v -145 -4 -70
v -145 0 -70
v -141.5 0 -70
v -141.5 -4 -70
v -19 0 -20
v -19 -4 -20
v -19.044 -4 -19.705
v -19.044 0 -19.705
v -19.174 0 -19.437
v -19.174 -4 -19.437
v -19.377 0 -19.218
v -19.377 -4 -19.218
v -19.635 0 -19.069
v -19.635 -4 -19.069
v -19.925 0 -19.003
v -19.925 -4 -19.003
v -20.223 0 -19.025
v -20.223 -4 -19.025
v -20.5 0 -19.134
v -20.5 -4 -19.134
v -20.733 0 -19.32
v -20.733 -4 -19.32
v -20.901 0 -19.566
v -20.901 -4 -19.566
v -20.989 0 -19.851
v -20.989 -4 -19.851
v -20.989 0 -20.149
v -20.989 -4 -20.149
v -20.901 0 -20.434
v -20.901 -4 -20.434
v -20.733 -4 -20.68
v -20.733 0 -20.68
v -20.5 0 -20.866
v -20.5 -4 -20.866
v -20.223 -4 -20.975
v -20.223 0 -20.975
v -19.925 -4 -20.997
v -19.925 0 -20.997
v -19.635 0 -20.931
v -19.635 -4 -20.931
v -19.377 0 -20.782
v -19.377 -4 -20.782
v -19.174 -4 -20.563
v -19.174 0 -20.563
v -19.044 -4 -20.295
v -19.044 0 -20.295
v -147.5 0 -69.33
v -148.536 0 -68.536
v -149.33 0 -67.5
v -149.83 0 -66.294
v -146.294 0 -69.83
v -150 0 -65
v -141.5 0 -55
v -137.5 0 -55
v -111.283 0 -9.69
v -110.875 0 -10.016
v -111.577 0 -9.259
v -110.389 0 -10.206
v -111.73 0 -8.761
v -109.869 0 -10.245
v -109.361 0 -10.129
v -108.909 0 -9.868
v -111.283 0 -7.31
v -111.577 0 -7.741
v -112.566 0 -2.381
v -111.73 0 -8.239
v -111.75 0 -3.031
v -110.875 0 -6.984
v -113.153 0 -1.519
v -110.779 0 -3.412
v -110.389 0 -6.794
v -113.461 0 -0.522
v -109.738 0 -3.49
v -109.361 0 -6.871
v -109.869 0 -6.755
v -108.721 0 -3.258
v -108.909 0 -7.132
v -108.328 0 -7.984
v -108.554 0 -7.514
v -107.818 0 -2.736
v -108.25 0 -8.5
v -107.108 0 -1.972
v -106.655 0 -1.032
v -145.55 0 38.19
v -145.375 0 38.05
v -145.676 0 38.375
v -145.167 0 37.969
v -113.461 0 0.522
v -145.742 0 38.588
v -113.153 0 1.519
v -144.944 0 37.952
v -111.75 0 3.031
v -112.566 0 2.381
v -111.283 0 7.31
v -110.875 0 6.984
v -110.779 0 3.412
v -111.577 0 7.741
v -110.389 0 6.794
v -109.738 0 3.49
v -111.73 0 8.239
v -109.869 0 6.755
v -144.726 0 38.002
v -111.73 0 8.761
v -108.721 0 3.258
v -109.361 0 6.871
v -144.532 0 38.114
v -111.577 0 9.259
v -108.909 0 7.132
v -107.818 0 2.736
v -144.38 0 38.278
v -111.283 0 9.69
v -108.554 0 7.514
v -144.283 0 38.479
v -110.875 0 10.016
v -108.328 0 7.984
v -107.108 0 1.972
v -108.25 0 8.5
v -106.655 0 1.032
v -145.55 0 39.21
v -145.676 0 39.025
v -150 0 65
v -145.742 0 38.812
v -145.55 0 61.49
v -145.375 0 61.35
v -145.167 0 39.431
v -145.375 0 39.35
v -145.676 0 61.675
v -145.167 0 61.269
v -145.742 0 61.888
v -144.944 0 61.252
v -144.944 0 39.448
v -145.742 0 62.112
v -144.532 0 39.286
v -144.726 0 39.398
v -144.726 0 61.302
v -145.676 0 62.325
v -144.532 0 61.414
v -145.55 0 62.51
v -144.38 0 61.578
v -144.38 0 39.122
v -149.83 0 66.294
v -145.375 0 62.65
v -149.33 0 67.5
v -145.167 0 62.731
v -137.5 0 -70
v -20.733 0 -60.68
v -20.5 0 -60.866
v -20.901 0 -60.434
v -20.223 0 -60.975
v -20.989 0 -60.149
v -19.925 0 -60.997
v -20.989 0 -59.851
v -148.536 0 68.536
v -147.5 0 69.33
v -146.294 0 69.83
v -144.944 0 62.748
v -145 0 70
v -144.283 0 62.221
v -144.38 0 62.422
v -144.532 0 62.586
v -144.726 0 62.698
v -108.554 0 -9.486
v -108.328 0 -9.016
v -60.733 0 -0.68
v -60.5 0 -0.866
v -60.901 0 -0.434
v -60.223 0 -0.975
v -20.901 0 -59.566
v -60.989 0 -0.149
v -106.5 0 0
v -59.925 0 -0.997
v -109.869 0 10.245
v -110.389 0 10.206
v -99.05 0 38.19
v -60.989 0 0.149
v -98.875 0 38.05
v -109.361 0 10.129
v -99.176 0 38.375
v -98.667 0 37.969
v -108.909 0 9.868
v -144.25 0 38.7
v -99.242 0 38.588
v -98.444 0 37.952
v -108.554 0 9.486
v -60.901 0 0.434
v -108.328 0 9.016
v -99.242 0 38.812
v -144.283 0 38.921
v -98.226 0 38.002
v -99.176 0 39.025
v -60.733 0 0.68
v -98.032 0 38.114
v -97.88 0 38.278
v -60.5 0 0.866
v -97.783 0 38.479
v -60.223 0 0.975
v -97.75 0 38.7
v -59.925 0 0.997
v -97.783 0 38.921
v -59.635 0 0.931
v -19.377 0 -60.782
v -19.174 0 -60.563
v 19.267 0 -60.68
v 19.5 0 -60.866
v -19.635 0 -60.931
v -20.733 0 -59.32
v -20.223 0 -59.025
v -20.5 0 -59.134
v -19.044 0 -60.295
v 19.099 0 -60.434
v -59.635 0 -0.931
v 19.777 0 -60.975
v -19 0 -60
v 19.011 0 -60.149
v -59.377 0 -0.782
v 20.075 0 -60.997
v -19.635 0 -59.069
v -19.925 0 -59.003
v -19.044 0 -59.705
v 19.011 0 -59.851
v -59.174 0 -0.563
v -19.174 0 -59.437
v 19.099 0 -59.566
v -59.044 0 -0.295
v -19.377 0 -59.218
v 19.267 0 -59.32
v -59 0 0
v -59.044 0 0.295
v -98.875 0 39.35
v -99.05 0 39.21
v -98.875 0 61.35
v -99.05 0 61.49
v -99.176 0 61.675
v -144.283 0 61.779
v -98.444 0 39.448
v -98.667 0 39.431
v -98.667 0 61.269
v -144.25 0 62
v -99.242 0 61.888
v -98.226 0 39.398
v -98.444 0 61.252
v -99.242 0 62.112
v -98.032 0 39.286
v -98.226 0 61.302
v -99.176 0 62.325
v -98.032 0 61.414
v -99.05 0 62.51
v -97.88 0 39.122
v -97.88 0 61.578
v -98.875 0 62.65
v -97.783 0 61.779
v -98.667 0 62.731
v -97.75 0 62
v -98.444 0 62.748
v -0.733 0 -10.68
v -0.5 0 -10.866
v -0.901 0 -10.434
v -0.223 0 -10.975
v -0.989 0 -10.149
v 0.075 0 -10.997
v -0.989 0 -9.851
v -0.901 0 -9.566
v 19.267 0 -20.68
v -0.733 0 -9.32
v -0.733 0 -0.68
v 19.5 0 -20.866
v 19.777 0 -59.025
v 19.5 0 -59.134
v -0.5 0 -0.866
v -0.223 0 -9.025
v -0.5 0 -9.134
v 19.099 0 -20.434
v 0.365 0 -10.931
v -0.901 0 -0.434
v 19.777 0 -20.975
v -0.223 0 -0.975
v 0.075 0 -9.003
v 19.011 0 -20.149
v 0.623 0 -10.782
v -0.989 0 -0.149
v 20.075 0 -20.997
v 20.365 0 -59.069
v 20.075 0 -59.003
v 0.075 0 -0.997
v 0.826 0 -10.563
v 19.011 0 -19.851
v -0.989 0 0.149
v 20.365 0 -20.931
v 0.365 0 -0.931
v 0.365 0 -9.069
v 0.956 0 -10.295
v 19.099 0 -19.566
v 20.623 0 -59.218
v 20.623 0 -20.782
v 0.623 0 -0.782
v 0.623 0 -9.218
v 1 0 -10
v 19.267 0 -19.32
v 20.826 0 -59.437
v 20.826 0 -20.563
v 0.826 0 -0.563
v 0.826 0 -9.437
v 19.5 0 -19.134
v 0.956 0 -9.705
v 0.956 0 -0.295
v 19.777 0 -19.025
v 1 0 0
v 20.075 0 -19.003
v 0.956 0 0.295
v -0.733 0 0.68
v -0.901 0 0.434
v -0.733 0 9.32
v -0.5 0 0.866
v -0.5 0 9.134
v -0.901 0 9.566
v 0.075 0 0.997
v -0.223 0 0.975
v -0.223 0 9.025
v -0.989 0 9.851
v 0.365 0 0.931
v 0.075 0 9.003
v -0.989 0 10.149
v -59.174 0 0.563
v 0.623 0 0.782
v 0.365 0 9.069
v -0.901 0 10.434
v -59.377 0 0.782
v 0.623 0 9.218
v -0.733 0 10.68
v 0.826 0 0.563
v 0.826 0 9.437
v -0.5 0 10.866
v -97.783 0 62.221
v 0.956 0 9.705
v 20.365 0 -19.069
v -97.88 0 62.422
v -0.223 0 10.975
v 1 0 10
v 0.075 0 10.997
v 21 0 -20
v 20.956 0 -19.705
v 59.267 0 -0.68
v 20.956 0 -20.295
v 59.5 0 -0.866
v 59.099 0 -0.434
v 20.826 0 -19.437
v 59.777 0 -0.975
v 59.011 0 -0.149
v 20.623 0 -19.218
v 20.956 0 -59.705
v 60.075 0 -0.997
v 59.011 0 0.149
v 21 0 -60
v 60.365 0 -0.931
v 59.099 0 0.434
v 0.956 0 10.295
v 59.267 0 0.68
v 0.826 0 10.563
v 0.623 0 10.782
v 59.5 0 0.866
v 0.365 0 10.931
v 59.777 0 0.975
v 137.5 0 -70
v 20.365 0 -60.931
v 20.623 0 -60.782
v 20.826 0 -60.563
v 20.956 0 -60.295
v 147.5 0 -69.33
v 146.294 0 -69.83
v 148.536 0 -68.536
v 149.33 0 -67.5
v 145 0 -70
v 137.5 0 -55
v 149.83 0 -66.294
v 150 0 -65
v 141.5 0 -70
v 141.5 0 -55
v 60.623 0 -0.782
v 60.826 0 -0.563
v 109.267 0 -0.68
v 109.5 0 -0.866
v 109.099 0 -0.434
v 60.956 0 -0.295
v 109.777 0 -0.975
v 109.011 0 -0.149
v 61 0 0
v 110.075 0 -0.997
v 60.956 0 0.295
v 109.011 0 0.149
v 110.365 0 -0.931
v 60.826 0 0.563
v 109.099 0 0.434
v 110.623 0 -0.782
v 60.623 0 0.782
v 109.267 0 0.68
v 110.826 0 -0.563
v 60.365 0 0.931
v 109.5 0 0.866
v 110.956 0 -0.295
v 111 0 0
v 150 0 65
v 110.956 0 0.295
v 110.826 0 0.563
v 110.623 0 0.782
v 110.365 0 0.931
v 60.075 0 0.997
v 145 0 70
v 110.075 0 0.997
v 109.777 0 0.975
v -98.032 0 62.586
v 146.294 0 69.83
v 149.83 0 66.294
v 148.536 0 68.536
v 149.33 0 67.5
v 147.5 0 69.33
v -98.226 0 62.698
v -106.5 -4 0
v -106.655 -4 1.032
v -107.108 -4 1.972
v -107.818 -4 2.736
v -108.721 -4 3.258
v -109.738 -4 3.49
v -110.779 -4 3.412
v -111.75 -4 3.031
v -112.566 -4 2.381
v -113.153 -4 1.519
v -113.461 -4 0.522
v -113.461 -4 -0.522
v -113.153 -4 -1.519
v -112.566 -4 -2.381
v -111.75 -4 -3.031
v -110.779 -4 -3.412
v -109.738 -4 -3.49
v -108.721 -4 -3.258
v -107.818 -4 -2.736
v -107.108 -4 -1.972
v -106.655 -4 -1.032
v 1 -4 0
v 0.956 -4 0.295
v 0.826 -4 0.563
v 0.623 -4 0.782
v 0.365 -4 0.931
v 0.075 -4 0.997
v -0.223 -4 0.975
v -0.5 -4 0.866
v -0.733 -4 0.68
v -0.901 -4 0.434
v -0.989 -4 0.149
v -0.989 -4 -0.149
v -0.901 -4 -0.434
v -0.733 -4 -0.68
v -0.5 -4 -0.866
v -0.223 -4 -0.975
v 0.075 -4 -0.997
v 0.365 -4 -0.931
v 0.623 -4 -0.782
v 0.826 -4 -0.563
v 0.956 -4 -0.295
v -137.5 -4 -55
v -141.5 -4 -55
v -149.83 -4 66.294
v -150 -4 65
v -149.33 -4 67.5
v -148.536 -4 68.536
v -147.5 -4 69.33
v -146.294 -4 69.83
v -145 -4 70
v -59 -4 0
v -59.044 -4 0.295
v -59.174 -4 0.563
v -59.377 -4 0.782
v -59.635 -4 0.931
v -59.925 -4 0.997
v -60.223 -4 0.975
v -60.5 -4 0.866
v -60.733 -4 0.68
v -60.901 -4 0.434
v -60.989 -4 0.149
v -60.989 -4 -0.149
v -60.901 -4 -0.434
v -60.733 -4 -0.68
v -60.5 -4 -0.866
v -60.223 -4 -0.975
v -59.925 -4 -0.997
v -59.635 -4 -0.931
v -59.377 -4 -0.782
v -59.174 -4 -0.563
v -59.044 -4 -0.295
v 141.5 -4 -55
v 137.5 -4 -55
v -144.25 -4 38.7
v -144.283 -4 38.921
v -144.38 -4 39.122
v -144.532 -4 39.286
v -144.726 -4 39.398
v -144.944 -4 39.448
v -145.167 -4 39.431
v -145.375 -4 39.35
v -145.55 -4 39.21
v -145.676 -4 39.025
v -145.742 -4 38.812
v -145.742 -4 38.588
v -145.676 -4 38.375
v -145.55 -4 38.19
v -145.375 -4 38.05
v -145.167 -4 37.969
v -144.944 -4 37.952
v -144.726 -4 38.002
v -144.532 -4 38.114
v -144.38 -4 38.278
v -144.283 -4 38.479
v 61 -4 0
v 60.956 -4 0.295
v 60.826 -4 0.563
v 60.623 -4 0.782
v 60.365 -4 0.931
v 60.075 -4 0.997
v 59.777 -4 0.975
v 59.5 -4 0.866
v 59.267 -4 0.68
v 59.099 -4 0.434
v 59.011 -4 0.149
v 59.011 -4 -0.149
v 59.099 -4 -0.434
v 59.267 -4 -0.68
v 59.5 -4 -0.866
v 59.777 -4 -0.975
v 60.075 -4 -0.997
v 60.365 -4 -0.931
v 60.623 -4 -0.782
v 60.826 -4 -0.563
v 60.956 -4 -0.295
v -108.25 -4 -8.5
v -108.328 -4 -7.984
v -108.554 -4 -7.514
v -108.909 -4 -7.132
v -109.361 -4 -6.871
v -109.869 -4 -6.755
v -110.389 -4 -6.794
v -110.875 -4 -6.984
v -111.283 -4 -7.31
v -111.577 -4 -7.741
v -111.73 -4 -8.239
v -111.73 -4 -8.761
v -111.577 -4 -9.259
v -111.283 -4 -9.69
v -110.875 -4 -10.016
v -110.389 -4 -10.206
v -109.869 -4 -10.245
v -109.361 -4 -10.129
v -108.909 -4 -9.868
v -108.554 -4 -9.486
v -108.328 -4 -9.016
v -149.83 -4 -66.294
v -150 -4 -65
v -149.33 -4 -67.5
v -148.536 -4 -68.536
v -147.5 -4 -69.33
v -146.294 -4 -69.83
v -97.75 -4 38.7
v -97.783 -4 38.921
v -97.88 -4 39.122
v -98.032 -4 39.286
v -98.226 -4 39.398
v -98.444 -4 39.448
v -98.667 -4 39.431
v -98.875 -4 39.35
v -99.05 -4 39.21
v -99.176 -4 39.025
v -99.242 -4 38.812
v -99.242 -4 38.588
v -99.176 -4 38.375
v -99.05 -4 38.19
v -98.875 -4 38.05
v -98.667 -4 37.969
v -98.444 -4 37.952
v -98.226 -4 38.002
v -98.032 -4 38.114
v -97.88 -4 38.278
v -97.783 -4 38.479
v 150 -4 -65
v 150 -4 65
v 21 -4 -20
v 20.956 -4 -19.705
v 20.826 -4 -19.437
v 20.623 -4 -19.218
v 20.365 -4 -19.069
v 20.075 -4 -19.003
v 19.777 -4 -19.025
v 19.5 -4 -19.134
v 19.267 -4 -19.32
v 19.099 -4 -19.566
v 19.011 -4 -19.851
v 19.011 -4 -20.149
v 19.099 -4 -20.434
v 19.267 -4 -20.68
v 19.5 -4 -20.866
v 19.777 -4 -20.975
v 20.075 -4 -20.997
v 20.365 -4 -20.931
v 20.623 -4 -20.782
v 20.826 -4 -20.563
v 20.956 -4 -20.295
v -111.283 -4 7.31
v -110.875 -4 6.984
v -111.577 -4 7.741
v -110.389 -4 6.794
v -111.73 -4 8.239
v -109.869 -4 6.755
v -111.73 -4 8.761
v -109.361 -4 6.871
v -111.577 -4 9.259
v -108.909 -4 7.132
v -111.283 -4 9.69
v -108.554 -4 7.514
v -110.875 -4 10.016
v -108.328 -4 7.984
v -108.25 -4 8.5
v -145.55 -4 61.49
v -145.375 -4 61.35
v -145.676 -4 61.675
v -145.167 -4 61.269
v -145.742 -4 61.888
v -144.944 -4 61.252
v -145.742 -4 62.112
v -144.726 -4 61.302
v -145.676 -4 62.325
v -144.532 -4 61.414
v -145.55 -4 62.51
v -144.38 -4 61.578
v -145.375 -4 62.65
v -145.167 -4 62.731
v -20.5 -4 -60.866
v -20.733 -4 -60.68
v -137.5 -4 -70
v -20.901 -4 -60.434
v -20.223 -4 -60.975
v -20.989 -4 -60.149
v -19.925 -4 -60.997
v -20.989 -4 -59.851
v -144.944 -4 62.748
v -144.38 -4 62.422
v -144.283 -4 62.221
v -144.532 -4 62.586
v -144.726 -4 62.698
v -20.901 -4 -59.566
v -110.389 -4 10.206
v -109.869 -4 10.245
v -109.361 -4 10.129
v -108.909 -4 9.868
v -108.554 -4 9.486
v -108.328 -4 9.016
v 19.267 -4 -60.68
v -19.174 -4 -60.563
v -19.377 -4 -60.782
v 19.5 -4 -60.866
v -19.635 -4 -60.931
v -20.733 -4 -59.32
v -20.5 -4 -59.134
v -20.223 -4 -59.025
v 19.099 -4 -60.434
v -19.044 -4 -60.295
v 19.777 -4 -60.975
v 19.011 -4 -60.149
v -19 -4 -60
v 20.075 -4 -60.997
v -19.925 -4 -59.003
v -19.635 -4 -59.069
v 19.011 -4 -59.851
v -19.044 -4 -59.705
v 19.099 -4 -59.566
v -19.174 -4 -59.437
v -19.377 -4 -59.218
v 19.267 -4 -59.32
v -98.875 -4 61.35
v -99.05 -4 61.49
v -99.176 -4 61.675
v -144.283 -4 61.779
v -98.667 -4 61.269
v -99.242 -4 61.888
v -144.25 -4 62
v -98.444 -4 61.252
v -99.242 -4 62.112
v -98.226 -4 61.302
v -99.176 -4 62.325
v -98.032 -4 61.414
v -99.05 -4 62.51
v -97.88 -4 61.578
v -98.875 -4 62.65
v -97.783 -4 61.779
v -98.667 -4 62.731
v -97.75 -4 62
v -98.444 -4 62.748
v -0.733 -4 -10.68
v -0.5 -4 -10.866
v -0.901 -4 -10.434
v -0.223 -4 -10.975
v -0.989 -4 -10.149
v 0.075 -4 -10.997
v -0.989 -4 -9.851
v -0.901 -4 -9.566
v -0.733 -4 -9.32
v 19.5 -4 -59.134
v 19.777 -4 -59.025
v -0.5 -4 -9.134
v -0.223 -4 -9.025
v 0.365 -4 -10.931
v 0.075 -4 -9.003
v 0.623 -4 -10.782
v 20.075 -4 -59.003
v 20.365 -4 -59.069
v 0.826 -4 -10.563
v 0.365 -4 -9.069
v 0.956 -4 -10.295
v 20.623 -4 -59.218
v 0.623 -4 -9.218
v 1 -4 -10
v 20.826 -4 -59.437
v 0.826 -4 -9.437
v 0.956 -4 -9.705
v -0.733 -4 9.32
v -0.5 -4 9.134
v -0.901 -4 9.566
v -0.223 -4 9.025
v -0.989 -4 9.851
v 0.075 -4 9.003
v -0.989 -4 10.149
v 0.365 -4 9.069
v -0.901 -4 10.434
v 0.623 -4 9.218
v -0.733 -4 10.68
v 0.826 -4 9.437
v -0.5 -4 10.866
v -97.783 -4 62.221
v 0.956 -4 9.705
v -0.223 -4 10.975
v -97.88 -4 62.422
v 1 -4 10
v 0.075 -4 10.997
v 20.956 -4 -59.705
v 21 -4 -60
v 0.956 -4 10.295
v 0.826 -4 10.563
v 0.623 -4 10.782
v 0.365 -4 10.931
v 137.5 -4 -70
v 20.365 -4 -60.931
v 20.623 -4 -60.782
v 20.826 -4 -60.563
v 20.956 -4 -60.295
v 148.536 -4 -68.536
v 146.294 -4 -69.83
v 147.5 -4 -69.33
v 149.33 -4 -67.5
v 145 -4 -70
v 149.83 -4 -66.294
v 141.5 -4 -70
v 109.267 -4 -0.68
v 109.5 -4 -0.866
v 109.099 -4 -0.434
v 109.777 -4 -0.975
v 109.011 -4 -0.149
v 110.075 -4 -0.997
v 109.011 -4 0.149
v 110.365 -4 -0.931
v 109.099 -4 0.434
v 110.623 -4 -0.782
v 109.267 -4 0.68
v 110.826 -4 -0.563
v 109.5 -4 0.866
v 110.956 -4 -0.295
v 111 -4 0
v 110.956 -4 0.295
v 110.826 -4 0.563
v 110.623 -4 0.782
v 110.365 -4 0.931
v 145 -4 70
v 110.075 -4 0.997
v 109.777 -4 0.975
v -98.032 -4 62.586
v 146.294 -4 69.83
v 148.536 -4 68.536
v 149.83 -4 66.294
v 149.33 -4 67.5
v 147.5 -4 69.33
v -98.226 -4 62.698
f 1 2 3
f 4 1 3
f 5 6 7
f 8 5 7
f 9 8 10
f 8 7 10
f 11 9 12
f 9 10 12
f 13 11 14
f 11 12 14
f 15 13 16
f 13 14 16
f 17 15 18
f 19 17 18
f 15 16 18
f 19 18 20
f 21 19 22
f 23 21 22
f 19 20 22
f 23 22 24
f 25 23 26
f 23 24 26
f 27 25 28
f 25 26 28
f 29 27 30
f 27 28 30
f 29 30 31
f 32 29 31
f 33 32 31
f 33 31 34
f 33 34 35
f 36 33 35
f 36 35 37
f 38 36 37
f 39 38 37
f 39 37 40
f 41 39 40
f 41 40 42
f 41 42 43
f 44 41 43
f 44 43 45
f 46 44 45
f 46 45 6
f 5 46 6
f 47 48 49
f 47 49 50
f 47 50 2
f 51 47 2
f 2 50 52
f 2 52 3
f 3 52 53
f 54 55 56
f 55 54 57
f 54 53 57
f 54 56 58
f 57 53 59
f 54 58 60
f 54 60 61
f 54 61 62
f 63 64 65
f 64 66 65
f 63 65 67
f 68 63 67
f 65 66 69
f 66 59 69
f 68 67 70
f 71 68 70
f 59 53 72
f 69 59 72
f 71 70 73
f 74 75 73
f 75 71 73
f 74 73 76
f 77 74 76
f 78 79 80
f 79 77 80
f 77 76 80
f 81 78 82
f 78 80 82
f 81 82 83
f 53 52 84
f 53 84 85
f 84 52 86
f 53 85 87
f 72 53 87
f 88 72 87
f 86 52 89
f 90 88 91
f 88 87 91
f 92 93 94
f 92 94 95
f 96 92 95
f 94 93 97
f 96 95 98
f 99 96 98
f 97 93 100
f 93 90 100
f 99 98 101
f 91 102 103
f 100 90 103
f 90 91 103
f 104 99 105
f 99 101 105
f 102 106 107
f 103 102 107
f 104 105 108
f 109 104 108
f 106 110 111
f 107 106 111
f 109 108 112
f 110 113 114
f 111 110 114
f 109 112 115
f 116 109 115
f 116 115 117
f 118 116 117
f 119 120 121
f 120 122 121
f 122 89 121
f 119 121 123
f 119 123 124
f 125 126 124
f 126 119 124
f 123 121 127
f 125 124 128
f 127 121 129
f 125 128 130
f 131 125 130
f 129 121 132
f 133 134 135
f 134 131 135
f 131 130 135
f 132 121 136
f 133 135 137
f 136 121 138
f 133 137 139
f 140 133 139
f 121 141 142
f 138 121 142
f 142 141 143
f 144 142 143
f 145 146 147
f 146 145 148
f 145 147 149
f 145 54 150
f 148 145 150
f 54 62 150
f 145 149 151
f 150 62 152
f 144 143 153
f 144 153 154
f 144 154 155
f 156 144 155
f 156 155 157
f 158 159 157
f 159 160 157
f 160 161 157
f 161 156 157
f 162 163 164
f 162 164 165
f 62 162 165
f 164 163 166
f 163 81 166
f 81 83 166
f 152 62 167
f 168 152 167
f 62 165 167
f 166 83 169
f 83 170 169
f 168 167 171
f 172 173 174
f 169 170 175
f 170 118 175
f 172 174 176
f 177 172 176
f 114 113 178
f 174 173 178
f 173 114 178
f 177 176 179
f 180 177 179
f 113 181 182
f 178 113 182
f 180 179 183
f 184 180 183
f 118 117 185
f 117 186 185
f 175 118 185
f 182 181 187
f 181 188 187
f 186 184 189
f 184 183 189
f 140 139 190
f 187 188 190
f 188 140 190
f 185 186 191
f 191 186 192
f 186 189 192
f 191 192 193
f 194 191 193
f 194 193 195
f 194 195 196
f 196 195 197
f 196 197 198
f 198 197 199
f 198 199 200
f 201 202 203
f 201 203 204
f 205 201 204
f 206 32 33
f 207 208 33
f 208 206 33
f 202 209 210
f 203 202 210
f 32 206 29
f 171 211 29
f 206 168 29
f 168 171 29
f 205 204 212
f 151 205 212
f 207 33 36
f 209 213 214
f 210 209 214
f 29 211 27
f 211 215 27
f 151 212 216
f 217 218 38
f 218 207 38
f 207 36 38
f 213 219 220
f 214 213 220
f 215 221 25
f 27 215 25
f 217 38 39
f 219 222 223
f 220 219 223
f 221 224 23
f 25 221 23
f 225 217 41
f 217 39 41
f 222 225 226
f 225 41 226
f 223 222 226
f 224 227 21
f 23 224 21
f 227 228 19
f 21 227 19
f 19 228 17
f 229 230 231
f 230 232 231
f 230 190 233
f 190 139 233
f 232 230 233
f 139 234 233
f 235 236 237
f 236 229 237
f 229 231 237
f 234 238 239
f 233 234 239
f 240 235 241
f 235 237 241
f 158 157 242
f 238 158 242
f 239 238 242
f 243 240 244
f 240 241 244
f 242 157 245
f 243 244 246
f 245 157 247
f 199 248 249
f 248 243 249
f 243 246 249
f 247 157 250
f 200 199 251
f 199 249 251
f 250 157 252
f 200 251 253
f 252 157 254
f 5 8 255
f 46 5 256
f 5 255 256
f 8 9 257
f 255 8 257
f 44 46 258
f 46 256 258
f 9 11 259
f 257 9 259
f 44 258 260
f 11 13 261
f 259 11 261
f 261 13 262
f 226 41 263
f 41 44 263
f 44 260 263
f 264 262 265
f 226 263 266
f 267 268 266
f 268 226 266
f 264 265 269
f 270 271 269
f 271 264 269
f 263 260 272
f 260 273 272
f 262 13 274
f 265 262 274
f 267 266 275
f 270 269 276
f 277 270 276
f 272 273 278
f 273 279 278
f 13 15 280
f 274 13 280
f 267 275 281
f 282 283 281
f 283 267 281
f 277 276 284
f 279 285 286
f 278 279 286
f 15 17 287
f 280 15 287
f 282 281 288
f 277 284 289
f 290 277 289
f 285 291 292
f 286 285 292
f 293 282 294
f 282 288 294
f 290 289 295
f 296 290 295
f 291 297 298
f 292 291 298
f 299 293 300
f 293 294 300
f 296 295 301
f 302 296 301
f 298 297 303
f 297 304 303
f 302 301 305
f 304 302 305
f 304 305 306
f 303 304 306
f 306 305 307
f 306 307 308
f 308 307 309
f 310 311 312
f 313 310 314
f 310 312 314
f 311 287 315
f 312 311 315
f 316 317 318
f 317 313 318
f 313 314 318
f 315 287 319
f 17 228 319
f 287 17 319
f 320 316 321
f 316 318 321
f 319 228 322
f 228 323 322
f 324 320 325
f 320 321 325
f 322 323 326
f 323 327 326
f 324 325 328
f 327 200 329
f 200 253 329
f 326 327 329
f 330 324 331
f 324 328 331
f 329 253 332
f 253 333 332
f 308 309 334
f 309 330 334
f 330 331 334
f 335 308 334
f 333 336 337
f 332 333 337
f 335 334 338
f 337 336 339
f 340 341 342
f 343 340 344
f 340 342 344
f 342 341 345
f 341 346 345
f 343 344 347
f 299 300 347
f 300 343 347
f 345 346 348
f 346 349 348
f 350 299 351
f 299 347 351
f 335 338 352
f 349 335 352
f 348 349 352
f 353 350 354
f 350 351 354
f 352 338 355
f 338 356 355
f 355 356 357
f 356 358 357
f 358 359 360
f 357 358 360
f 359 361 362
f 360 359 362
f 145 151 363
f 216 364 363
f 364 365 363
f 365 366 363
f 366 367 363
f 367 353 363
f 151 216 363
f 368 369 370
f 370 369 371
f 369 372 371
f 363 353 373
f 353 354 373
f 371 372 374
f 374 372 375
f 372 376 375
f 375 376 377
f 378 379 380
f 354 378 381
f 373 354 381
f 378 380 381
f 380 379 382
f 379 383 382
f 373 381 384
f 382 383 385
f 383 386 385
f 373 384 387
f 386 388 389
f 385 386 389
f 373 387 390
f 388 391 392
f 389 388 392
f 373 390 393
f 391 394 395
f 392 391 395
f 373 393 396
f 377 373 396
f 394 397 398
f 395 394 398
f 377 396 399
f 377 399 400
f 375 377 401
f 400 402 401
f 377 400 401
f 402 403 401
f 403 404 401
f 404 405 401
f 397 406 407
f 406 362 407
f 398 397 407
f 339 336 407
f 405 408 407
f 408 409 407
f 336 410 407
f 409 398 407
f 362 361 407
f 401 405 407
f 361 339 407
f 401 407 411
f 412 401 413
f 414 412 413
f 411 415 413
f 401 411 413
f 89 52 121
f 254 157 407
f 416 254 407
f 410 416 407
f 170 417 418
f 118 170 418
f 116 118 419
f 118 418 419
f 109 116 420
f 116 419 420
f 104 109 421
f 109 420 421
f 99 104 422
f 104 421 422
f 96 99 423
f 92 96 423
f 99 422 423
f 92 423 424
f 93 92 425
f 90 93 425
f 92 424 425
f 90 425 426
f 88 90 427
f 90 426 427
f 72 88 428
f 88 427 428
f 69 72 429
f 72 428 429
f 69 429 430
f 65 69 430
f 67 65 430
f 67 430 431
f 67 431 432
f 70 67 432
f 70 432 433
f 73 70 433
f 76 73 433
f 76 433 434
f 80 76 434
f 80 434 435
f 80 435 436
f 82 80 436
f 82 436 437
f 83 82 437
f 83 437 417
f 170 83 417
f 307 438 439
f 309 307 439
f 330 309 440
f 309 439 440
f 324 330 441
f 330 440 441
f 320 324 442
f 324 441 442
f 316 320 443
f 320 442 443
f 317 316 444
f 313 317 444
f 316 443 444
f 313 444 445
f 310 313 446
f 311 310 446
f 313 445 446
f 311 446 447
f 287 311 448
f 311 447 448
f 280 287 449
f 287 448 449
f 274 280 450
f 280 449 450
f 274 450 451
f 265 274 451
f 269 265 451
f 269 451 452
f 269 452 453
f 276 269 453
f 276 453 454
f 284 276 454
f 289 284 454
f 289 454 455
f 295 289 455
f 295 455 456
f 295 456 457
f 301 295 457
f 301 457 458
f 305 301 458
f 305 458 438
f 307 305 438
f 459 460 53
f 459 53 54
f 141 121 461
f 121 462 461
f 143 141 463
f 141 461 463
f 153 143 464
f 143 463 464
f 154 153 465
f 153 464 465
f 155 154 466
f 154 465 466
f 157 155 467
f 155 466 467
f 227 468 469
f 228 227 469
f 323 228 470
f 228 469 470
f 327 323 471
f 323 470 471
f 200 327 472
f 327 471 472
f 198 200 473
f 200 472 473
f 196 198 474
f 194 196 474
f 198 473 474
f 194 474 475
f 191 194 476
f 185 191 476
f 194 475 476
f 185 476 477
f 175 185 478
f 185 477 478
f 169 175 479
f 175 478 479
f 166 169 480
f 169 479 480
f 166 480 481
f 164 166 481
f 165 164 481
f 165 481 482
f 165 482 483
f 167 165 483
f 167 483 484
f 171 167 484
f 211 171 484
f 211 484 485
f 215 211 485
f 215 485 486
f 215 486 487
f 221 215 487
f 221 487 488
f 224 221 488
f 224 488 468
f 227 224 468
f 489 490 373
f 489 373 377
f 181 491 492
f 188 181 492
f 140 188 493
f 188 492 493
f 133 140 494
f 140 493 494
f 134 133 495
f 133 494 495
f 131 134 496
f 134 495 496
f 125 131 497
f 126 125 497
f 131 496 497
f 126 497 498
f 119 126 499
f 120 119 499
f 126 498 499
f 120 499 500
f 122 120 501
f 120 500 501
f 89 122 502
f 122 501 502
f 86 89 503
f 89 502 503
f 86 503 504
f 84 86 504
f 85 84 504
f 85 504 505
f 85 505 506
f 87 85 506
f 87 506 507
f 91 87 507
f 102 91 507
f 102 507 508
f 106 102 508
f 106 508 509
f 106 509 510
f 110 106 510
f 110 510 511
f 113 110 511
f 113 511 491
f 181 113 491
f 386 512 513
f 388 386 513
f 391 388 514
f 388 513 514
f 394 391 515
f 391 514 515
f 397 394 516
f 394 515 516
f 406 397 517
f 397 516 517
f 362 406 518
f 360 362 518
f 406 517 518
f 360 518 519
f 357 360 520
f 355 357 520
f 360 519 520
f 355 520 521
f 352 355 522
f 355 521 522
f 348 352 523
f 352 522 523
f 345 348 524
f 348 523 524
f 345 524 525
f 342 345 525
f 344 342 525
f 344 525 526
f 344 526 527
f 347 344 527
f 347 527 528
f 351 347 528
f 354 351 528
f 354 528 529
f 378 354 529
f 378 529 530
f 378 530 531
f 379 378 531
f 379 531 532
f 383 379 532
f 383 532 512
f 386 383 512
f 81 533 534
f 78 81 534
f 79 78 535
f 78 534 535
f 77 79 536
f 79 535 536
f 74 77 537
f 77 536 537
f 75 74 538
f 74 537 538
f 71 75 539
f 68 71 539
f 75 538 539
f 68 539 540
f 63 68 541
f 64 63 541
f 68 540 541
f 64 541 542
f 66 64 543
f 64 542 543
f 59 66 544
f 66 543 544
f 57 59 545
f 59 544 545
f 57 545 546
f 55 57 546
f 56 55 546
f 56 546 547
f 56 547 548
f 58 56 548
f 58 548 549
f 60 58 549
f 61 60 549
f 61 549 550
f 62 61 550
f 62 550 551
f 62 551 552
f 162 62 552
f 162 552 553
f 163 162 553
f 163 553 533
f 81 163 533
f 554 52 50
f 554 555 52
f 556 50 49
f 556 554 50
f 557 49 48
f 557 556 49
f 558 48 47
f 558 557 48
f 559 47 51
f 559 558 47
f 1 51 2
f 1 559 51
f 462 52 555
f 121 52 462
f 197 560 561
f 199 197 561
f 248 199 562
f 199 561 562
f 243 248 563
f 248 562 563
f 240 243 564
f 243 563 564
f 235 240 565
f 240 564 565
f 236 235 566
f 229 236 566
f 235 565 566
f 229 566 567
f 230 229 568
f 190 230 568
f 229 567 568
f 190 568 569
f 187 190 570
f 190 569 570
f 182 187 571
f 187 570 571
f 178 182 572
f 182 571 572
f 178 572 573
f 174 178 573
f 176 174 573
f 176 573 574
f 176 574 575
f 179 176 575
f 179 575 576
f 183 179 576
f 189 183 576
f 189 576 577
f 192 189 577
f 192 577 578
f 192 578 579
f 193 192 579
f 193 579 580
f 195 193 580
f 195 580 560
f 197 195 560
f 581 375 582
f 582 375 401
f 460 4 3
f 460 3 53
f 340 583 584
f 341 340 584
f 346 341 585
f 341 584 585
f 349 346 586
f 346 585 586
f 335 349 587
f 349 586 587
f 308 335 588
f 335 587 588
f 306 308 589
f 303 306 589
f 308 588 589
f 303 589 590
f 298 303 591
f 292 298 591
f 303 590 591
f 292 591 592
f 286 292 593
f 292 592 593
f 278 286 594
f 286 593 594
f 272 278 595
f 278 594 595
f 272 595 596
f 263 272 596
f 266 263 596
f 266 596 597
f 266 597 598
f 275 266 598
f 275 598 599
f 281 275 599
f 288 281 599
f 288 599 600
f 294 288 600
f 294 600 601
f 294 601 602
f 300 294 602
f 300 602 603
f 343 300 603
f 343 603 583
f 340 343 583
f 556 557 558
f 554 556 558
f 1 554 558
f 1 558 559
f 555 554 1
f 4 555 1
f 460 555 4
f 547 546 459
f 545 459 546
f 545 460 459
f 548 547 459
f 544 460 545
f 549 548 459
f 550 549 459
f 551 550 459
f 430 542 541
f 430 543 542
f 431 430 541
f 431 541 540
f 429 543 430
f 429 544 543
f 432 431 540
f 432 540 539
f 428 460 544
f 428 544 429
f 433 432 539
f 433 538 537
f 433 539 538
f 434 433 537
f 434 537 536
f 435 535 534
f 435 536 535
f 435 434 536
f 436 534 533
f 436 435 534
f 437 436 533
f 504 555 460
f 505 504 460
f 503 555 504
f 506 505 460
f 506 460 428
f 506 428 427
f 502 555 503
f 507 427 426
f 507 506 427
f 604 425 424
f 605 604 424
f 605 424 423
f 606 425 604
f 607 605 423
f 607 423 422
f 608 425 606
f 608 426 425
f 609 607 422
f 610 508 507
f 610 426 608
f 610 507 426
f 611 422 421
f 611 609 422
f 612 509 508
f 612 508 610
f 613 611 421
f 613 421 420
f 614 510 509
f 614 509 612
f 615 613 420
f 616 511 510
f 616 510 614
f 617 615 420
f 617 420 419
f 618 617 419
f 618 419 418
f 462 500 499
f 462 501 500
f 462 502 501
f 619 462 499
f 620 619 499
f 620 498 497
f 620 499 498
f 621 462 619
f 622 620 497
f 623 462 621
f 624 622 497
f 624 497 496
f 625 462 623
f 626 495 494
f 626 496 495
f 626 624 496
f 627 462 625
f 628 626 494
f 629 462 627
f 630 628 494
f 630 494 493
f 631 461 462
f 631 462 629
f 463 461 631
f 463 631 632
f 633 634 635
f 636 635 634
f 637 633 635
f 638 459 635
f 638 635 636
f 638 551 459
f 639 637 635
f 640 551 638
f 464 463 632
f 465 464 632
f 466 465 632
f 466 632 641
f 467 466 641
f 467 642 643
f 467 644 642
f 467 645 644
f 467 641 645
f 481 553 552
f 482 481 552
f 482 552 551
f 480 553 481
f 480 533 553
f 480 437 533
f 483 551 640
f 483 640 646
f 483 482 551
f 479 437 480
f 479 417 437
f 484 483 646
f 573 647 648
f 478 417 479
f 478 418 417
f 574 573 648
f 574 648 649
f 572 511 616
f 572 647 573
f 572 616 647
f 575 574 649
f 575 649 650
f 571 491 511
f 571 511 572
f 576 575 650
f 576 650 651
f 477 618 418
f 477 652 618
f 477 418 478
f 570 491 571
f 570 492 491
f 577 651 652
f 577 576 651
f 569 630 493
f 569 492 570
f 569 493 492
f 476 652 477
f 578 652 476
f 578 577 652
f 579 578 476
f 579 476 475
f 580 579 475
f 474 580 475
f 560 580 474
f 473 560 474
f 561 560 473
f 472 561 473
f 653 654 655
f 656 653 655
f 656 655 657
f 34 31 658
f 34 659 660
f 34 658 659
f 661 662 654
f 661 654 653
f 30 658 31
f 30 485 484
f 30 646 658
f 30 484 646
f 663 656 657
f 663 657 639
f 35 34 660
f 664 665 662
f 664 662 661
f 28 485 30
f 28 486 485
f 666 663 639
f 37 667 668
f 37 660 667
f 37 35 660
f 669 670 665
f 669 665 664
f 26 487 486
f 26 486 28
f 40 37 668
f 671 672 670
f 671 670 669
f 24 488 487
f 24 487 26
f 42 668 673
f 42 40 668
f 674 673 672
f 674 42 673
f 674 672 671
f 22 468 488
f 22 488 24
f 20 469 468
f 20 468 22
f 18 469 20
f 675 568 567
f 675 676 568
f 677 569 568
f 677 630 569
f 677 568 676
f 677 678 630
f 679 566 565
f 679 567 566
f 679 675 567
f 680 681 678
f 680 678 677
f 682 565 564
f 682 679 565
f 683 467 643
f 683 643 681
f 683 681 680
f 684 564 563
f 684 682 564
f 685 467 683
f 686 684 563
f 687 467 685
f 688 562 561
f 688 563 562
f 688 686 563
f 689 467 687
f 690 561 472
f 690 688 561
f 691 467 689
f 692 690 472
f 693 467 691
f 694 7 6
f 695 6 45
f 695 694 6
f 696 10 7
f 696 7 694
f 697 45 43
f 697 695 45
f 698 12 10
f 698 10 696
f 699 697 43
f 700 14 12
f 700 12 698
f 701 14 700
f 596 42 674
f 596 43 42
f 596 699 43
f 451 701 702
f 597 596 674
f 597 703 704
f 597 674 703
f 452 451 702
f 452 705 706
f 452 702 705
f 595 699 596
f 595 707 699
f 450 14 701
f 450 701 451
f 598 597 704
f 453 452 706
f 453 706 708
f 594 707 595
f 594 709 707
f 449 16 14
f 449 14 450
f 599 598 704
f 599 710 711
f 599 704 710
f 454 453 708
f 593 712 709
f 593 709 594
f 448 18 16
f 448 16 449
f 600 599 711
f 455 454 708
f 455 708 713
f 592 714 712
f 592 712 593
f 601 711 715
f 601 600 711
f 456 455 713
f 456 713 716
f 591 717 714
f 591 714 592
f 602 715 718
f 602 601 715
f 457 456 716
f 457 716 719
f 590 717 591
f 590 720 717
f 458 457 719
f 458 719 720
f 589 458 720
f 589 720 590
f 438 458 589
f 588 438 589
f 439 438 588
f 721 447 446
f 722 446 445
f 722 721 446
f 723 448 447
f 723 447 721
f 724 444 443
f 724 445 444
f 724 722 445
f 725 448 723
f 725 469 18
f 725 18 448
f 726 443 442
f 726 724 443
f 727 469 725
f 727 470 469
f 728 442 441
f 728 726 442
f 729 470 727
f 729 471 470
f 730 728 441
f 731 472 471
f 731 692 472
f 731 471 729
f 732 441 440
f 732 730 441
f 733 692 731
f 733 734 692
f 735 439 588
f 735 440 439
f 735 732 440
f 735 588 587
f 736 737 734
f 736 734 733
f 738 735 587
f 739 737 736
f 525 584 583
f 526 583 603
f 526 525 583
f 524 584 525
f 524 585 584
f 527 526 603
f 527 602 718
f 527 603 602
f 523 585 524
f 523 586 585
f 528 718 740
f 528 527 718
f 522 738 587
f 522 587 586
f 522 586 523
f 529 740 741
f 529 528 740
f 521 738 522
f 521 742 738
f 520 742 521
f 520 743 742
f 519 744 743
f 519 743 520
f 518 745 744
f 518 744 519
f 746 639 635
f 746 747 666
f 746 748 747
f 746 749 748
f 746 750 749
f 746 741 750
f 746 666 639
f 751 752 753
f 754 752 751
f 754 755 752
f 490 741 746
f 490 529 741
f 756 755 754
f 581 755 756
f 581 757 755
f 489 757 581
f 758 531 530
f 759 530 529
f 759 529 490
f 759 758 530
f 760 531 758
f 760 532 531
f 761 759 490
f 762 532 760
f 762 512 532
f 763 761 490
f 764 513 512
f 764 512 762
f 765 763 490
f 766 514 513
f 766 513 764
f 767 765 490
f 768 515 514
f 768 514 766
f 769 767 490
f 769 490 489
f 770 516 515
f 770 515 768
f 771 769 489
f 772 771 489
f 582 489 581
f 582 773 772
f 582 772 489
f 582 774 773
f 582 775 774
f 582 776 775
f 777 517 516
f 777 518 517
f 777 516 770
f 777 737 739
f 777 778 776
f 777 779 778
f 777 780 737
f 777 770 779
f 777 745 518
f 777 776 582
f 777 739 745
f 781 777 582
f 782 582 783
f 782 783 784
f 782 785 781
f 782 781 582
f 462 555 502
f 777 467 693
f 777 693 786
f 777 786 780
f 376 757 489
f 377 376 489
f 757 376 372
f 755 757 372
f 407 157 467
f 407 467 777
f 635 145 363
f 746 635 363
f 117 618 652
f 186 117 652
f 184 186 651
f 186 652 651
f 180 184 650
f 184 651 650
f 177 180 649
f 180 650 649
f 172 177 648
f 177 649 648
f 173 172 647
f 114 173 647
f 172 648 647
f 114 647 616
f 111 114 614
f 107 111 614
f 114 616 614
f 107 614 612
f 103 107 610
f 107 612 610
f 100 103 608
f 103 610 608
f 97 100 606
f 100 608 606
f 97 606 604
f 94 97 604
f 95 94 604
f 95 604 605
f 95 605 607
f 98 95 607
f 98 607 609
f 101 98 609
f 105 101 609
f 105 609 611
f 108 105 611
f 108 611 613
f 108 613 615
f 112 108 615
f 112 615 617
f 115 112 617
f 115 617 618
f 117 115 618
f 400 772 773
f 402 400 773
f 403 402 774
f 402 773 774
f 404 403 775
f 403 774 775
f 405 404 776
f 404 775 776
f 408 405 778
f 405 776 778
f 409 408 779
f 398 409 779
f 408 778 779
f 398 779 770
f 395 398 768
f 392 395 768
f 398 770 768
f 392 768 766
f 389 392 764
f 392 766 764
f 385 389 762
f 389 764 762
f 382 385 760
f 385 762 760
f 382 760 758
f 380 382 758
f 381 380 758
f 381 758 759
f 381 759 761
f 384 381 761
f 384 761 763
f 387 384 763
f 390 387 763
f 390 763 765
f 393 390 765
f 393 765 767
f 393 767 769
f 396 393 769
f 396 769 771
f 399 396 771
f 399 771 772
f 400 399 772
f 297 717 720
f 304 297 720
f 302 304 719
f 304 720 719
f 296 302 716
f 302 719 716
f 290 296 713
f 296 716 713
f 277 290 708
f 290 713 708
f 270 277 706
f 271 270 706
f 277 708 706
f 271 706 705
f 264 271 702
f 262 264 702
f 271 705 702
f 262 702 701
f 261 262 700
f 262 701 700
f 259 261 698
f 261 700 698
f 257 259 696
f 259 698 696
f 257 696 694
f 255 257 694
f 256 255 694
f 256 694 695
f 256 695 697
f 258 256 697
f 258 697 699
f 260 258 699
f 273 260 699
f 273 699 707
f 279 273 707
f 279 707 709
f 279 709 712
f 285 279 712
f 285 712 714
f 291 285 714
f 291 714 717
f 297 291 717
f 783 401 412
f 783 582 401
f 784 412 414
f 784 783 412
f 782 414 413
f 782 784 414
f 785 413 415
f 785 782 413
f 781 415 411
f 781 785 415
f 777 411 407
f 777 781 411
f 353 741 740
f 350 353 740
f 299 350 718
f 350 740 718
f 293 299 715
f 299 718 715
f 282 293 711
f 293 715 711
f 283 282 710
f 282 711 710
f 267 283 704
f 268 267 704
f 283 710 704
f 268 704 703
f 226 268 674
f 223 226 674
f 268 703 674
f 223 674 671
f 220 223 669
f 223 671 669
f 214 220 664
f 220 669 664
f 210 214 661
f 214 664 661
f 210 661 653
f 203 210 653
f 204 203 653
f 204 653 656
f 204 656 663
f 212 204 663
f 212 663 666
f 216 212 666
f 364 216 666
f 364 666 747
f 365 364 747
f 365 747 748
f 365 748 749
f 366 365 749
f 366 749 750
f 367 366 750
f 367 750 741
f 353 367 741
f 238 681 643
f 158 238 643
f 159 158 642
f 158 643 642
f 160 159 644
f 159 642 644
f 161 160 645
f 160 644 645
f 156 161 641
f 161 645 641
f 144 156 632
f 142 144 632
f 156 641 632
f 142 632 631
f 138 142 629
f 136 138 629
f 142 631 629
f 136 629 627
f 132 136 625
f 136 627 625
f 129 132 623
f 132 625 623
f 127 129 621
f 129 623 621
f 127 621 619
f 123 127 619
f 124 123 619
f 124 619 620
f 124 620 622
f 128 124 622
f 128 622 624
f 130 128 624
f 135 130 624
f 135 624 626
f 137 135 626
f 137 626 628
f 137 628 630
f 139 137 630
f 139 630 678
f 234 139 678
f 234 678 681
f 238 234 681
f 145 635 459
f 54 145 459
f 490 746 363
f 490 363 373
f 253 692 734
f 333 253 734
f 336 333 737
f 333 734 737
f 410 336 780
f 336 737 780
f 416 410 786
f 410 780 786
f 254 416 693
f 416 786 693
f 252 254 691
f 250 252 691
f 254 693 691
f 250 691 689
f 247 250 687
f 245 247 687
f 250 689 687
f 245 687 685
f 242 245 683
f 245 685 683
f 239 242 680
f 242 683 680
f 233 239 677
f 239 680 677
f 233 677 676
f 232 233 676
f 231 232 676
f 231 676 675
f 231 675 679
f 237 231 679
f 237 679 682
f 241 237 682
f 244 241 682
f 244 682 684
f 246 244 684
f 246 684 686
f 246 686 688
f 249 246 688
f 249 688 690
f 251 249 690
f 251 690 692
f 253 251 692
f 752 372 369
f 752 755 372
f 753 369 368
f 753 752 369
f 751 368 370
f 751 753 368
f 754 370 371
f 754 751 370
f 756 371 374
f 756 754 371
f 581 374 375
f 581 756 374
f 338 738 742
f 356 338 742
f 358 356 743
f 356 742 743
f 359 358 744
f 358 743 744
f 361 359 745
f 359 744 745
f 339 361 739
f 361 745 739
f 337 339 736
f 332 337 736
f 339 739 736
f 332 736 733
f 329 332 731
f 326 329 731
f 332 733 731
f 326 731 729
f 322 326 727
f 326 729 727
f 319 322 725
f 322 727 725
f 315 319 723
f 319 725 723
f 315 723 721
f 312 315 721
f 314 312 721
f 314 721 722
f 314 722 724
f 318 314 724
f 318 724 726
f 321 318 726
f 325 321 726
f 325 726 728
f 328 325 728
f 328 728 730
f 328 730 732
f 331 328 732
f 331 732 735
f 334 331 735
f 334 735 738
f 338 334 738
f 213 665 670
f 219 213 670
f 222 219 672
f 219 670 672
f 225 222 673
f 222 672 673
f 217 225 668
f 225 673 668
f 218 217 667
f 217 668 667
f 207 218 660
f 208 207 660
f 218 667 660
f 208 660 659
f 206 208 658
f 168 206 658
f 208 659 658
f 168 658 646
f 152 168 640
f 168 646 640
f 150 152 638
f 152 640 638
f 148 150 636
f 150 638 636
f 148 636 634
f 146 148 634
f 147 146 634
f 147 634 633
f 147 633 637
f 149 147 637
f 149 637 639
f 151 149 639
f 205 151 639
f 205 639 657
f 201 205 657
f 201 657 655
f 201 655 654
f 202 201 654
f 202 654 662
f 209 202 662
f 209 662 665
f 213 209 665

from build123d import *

# Parameters (mm, degrees)
F0_W     = 300
F0_H     = 140
F1_DEPTH = 4
F2_R     = 5
F3_R     = 1
F3_R_2   = 3.5
F3_R_3   = 1.75
F3_W     = 4
F3_H     = 15
F3_R_4   = 0.75
F4_DEPTH = 4.001
F5_R     = 1
F6_DEPTH = 4.001


with BuildPart() as f1:
    # F0 (on Front) → F1 (new body)
    with BuildSketch(Plane.XZ):
        Rectangle(F0_W, F0_H)
    extrude(amount=F1_DEPTH)

    # F2
    f2_edges = [f1.edges().sort_by_distance(p)[0] for p in [
        (150, -2, 70),
        (150, -2, -70),
        (-150, -2, -70),
        (-150, -2, 70),
    ]]
    fillet(f2_edges, radius=F2_R)

    # F3 (on face) → F4 (cut, through all)
    with BuildSketch(Plane.XZ.offset(4)):
        Circle(F3_R)
        with Locations((60, 0)):
            Circle(F3_R)
        with Locations((-60, 0)):
            Circle(F3_R)
        with Locations((-110, 0)):
            Circle(F3_R_2)
        with Locations((110, 0)):
            Circle(F3_R)
        with Locations((-110, 8.5)):
            Circle(F3_R_3)
        with Locations((-110, -8.5)):
            Circle(F3_R_3)
        with Locations((-139.5, -62.5)):
            Rectangle(F3_W, F3_H)
        with Locations((139.5, -62.5)):
            Rectangle(F3_W, F3_H)
        with Locations((-145, 62)):
            Circle(F3_R_4)
        with Locations((-98.5, 62)):
            Circle(F3_R_4)
        with Locations((-145, 38.7)):
            Circle(F3_R_4)
        with Locations((-98.5, 38.7)):
            Circle(F3_R_4)
        with Locations((-20, -20)):
            Circle(F3_R)
        with Locations((20, -20)):
            Circle(F3_R)
        with Locations((20, -60)):
            Circle(F3_R)
        with Locations((-20, -60)):
            Circle(F3_R)
    extrude(amount=-F4_DEPTH, mode=Mode.SUBTRACT)

    # F5 (on face) → F6 (cut, through all)
    with BuildSketch(Plane.XZ.offset(4)):
        with Locations((0, 10)):
            Circle(F5_R)
        with Locations((0, -10)):
            Circle(F5_R)
    extrude(amount=-F6_DEPTH, mode=Mode.SUBTRACT)


solid = f1.part
